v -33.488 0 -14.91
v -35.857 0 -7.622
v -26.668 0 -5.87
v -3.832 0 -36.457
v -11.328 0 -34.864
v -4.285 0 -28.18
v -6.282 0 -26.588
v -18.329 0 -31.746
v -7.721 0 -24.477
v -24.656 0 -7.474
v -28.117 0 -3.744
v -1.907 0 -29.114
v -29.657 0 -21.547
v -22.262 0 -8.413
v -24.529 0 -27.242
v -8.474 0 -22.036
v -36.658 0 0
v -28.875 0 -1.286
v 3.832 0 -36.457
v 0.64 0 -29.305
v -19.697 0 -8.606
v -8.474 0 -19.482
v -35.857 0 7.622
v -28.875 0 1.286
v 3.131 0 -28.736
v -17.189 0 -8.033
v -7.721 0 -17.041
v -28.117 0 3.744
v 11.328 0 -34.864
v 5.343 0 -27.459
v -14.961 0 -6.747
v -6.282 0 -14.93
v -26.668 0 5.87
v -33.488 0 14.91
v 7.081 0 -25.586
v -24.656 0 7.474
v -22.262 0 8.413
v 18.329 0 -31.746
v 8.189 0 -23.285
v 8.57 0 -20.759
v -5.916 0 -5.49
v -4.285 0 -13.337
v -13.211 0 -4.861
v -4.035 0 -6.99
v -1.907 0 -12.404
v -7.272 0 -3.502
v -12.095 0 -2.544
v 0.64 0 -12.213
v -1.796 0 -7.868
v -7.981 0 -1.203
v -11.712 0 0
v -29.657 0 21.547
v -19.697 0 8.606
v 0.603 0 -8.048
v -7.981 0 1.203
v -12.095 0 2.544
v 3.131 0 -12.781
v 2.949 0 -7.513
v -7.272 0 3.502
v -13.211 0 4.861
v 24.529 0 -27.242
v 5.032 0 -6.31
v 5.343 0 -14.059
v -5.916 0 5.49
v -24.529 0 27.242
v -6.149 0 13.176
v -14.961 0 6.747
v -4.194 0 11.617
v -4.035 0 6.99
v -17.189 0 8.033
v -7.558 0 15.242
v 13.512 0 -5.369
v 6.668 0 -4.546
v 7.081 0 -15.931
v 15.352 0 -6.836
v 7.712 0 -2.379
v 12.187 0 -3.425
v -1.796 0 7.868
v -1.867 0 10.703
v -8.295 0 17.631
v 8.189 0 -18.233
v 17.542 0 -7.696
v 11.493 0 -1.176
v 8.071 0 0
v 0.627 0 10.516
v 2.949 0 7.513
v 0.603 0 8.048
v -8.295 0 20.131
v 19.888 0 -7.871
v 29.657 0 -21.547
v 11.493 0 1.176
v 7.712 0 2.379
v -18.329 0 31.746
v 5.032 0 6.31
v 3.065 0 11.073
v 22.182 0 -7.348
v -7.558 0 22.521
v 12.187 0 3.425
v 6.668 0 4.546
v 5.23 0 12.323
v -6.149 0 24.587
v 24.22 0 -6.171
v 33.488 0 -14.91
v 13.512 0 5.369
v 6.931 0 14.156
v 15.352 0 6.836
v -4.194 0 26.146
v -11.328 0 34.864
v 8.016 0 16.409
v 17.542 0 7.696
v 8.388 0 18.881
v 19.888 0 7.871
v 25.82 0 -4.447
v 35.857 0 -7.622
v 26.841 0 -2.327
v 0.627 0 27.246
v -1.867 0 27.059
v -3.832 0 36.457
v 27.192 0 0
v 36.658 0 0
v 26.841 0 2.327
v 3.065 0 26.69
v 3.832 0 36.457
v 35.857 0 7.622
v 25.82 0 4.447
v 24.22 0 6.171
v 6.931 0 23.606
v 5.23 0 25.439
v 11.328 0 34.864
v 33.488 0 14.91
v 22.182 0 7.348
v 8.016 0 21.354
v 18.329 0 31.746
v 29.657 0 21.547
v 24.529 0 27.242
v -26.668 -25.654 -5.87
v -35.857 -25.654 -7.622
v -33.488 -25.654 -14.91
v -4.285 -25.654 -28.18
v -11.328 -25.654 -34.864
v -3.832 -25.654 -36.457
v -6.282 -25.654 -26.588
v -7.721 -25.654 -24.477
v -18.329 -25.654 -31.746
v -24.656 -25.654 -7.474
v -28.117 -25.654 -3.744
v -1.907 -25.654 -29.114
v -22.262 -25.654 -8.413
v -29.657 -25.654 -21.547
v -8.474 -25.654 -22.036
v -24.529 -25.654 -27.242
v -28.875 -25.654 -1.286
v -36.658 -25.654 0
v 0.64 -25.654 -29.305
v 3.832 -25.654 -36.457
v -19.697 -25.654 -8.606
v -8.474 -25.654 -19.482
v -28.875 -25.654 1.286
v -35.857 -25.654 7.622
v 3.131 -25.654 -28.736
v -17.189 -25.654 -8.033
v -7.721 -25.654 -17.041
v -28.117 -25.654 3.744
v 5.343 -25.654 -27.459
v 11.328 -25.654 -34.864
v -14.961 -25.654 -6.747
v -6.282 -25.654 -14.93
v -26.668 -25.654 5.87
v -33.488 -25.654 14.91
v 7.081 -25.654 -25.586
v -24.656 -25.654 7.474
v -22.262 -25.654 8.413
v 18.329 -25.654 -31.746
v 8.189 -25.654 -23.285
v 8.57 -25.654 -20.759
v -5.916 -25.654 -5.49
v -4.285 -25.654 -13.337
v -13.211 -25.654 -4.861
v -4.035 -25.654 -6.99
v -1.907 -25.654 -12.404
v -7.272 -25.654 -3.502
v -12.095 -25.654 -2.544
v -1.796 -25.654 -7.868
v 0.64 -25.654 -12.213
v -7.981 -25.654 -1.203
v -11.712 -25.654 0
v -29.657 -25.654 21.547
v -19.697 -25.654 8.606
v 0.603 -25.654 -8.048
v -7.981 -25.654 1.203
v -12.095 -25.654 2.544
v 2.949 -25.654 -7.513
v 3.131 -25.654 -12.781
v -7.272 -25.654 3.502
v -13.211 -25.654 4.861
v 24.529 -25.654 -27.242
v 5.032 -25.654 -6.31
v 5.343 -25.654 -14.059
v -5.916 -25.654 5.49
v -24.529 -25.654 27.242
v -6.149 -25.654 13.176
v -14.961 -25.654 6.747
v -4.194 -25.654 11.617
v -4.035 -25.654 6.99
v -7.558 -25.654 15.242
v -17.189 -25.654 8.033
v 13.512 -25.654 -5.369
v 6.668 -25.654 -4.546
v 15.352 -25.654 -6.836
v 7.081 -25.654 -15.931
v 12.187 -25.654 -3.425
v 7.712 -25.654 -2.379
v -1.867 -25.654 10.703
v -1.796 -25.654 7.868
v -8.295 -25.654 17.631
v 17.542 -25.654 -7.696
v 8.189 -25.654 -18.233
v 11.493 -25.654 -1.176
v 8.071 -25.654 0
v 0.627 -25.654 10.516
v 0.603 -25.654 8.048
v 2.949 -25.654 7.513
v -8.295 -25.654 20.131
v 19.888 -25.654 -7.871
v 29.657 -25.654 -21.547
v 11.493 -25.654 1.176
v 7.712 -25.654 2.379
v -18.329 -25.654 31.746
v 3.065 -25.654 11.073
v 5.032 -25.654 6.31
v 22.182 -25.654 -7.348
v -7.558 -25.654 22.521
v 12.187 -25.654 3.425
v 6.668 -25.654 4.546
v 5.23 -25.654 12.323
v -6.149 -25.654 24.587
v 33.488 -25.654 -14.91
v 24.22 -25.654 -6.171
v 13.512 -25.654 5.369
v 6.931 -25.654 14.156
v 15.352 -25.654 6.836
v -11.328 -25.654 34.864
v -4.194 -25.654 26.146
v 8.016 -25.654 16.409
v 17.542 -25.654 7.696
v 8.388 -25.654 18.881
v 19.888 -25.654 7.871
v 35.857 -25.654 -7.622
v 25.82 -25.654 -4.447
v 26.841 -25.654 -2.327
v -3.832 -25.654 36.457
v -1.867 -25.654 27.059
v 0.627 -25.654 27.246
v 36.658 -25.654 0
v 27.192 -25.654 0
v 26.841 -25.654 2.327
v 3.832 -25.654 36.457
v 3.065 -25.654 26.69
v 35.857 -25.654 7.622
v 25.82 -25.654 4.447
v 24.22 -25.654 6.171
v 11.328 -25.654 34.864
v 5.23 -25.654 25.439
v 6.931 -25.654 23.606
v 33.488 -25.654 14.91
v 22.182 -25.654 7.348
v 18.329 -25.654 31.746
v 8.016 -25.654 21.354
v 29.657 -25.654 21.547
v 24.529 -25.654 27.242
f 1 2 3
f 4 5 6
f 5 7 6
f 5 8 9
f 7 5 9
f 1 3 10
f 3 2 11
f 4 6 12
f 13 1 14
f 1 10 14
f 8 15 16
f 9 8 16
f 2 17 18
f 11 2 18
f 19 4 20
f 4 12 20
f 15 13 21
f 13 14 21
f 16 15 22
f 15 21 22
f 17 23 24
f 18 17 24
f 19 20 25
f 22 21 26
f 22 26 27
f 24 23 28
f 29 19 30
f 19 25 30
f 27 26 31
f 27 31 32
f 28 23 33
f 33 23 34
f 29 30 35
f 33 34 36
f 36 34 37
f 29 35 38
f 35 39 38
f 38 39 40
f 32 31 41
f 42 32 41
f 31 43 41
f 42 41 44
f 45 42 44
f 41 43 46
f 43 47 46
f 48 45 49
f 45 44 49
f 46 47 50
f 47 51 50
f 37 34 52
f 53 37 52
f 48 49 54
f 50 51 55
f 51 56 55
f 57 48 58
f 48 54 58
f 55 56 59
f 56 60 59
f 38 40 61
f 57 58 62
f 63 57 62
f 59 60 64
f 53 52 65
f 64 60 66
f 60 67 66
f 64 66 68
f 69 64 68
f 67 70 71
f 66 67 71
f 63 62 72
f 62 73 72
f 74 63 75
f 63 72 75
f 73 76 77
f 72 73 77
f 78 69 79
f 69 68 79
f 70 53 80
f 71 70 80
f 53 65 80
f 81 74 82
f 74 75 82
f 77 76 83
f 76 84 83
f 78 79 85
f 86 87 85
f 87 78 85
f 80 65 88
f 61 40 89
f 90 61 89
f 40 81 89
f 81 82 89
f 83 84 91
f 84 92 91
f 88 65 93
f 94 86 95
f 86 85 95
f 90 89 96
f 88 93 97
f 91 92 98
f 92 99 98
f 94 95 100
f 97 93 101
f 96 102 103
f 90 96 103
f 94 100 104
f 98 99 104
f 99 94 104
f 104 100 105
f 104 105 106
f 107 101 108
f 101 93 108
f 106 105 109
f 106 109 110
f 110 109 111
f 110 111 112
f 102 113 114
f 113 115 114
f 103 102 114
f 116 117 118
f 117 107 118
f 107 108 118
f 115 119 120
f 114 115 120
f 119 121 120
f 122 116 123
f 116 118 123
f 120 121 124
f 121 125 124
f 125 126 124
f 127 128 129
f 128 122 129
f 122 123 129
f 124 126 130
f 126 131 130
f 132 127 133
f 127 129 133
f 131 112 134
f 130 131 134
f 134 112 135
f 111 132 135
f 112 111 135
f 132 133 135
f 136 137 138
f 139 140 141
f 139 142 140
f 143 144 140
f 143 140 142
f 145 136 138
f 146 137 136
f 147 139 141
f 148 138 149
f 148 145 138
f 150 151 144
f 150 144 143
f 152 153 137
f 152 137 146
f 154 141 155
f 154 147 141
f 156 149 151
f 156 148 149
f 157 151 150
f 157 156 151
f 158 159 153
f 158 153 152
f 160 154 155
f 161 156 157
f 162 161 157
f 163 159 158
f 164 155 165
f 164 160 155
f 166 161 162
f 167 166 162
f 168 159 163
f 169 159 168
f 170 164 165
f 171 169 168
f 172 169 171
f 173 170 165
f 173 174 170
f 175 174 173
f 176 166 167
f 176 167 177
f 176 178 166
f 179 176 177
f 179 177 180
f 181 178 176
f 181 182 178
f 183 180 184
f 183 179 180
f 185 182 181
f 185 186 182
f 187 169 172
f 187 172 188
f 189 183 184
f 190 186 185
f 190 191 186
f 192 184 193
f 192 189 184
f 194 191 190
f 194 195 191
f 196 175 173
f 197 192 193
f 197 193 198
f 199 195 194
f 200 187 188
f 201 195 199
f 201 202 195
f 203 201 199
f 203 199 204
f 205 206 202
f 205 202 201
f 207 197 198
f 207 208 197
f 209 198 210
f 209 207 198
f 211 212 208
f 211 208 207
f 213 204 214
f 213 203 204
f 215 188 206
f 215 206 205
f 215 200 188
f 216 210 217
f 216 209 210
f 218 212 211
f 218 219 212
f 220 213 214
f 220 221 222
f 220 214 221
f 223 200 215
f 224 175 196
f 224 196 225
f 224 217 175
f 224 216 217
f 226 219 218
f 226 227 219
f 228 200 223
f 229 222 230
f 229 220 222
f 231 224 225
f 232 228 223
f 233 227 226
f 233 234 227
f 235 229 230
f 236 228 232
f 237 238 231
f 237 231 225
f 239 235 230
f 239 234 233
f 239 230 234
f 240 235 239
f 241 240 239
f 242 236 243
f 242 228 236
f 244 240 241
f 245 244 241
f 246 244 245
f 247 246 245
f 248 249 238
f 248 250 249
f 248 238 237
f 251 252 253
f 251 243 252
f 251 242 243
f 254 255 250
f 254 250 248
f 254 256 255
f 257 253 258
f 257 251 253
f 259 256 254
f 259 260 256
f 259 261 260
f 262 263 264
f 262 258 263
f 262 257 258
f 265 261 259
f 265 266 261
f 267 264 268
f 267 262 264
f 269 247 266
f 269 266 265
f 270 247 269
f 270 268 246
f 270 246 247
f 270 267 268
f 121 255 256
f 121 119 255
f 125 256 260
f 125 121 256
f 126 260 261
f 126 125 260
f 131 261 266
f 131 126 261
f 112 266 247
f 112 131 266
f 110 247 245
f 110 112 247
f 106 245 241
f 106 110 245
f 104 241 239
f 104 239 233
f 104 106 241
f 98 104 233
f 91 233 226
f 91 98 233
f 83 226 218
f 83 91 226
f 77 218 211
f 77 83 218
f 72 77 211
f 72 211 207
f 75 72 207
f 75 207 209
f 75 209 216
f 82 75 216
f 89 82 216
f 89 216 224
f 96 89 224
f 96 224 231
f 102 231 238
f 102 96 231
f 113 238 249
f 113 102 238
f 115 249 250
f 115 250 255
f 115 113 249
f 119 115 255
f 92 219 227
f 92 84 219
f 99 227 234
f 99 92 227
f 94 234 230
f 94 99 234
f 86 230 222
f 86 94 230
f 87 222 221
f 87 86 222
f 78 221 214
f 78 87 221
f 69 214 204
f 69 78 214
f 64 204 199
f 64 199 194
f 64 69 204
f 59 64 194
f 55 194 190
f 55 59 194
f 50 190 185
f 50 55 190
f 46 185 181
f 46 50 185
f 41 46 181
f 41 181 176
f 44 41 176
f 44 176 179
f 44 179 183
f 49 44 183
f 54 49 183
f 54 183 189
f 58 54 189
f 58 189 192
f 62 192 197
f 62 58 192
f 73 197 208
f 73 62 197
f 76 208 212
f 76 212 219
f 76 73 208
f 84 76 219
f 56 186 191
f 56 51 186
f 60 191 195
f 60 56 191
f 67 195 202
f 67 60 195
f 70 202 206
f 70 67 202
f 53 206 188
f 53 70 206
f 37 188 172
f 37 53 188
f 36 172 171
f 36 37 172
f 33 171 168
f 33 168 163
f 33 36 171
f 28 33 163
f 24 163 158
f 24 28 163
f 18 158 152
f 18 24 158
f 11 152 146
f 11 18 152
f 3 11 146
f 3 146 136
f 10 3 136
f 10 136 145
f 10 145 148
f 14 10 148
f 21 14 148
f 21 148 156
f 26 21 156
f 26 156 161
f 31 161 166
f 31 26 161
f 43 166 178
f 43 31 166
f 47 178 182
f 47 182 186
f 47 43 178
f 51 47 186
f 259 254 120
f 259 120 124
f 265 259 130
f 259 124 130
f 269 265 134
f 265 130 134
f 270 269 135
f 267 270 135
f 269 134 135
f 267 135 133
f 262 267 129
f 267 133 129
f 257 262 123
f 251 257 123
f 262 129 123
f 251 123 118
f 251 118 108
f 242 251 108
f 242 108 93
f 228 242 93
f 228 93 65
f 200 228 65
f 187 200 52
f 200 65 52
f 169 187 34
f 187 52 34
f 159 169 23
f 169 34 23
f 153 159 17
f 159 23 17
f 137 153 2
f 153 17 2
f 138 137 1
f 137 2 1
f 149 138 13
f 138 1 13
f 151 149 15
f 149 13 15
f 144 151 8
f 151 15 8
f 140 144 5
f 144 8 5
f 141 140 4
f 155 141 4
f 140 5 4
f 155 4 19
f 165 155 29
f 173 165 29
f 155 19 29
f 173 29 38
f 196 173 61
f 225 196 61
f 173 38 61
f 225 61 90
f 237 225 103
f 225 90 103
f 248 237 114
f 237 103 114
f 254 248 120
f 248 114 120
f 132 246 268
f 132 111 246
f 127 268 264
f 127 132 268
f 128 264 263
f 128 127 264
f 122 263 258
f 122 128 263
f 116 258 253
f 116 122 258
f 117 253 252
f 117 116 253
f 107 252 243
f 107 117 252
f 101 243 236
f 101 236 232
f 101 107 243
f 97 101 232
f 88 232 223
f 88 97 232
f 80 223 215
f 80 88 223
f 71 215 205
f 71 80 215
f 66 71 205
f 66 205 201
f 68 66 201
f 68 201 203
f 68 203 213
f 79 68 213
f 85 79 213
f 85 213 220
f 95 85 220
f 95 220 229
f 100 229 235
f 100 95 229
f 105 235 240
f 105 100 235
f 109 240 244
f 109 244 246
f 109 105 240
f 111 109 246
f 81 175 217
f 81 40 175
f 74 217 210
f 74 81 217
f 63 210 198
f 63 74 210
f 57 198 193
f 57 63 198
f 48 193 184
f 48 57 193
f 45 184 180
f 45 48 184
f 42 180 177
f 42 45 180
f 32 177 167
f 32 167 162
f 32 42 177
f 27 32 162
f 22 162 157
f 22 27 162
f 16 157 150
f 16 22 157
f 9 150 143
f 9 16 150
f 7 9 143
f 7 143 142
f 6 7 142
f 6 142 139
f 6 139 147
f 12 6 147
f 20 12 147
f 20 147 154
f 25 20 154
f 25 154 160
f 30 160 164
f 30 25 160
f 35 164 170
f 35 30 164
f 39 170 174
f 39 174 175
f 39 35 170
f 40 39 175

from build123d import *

# Parameters (mm, degrees)
F0_R     = 36.6576669804
F0_R_2   = 32.6402559025
F0_R_3   = 8.5697598479
F0_R_4   = 8.6296556848
F0_R_5   = 8.0708127358
F0_R_6   = 7.8935022325
F0_R_7   = 8.3883706744
F1_DEPTH = 25.4
F2_DEPTH = 0.254


with BuildPart() as f1:
    # F0 (on Front) → F1 (new body)
    with BuildSketch(Plane.XZ):
        Circle(F0_R)
        Circle(F0_R_2, mode=Mode.SUBTRACT)
        Circle(F0_R_2)
        with Locations((0, -20.7587890327)):
            Circle(F0_R_3, mode=Mode.SUBTRACT)
        with Locations((-20.3415248543, 0)):
            Circle(F0_R_4, mode=Mode.SUBTRACT)
        Circle(F0_R_5, mode=Mode.SUBTRACT)
        with Locations((19.2983709276, 0)):
            Circle(F0_R_6, mode=Mode.SUBTRACT)
        with Locations((0, 18.8811086118)):
            Circle(F0_R_7, mode=Mode.SUBTRACT)
    extrude(amount=F1_DEPTH)

    # F2 (add): a face of the model
    f2_faces = [f1.faces().sort_by_distance(p)[0] for p in [
        (-9.6065952441, -25.4, -20.7587890327),
    ]]
    extrude(f2_faces, amount=F2_DEPTH)


solid = f1.part
